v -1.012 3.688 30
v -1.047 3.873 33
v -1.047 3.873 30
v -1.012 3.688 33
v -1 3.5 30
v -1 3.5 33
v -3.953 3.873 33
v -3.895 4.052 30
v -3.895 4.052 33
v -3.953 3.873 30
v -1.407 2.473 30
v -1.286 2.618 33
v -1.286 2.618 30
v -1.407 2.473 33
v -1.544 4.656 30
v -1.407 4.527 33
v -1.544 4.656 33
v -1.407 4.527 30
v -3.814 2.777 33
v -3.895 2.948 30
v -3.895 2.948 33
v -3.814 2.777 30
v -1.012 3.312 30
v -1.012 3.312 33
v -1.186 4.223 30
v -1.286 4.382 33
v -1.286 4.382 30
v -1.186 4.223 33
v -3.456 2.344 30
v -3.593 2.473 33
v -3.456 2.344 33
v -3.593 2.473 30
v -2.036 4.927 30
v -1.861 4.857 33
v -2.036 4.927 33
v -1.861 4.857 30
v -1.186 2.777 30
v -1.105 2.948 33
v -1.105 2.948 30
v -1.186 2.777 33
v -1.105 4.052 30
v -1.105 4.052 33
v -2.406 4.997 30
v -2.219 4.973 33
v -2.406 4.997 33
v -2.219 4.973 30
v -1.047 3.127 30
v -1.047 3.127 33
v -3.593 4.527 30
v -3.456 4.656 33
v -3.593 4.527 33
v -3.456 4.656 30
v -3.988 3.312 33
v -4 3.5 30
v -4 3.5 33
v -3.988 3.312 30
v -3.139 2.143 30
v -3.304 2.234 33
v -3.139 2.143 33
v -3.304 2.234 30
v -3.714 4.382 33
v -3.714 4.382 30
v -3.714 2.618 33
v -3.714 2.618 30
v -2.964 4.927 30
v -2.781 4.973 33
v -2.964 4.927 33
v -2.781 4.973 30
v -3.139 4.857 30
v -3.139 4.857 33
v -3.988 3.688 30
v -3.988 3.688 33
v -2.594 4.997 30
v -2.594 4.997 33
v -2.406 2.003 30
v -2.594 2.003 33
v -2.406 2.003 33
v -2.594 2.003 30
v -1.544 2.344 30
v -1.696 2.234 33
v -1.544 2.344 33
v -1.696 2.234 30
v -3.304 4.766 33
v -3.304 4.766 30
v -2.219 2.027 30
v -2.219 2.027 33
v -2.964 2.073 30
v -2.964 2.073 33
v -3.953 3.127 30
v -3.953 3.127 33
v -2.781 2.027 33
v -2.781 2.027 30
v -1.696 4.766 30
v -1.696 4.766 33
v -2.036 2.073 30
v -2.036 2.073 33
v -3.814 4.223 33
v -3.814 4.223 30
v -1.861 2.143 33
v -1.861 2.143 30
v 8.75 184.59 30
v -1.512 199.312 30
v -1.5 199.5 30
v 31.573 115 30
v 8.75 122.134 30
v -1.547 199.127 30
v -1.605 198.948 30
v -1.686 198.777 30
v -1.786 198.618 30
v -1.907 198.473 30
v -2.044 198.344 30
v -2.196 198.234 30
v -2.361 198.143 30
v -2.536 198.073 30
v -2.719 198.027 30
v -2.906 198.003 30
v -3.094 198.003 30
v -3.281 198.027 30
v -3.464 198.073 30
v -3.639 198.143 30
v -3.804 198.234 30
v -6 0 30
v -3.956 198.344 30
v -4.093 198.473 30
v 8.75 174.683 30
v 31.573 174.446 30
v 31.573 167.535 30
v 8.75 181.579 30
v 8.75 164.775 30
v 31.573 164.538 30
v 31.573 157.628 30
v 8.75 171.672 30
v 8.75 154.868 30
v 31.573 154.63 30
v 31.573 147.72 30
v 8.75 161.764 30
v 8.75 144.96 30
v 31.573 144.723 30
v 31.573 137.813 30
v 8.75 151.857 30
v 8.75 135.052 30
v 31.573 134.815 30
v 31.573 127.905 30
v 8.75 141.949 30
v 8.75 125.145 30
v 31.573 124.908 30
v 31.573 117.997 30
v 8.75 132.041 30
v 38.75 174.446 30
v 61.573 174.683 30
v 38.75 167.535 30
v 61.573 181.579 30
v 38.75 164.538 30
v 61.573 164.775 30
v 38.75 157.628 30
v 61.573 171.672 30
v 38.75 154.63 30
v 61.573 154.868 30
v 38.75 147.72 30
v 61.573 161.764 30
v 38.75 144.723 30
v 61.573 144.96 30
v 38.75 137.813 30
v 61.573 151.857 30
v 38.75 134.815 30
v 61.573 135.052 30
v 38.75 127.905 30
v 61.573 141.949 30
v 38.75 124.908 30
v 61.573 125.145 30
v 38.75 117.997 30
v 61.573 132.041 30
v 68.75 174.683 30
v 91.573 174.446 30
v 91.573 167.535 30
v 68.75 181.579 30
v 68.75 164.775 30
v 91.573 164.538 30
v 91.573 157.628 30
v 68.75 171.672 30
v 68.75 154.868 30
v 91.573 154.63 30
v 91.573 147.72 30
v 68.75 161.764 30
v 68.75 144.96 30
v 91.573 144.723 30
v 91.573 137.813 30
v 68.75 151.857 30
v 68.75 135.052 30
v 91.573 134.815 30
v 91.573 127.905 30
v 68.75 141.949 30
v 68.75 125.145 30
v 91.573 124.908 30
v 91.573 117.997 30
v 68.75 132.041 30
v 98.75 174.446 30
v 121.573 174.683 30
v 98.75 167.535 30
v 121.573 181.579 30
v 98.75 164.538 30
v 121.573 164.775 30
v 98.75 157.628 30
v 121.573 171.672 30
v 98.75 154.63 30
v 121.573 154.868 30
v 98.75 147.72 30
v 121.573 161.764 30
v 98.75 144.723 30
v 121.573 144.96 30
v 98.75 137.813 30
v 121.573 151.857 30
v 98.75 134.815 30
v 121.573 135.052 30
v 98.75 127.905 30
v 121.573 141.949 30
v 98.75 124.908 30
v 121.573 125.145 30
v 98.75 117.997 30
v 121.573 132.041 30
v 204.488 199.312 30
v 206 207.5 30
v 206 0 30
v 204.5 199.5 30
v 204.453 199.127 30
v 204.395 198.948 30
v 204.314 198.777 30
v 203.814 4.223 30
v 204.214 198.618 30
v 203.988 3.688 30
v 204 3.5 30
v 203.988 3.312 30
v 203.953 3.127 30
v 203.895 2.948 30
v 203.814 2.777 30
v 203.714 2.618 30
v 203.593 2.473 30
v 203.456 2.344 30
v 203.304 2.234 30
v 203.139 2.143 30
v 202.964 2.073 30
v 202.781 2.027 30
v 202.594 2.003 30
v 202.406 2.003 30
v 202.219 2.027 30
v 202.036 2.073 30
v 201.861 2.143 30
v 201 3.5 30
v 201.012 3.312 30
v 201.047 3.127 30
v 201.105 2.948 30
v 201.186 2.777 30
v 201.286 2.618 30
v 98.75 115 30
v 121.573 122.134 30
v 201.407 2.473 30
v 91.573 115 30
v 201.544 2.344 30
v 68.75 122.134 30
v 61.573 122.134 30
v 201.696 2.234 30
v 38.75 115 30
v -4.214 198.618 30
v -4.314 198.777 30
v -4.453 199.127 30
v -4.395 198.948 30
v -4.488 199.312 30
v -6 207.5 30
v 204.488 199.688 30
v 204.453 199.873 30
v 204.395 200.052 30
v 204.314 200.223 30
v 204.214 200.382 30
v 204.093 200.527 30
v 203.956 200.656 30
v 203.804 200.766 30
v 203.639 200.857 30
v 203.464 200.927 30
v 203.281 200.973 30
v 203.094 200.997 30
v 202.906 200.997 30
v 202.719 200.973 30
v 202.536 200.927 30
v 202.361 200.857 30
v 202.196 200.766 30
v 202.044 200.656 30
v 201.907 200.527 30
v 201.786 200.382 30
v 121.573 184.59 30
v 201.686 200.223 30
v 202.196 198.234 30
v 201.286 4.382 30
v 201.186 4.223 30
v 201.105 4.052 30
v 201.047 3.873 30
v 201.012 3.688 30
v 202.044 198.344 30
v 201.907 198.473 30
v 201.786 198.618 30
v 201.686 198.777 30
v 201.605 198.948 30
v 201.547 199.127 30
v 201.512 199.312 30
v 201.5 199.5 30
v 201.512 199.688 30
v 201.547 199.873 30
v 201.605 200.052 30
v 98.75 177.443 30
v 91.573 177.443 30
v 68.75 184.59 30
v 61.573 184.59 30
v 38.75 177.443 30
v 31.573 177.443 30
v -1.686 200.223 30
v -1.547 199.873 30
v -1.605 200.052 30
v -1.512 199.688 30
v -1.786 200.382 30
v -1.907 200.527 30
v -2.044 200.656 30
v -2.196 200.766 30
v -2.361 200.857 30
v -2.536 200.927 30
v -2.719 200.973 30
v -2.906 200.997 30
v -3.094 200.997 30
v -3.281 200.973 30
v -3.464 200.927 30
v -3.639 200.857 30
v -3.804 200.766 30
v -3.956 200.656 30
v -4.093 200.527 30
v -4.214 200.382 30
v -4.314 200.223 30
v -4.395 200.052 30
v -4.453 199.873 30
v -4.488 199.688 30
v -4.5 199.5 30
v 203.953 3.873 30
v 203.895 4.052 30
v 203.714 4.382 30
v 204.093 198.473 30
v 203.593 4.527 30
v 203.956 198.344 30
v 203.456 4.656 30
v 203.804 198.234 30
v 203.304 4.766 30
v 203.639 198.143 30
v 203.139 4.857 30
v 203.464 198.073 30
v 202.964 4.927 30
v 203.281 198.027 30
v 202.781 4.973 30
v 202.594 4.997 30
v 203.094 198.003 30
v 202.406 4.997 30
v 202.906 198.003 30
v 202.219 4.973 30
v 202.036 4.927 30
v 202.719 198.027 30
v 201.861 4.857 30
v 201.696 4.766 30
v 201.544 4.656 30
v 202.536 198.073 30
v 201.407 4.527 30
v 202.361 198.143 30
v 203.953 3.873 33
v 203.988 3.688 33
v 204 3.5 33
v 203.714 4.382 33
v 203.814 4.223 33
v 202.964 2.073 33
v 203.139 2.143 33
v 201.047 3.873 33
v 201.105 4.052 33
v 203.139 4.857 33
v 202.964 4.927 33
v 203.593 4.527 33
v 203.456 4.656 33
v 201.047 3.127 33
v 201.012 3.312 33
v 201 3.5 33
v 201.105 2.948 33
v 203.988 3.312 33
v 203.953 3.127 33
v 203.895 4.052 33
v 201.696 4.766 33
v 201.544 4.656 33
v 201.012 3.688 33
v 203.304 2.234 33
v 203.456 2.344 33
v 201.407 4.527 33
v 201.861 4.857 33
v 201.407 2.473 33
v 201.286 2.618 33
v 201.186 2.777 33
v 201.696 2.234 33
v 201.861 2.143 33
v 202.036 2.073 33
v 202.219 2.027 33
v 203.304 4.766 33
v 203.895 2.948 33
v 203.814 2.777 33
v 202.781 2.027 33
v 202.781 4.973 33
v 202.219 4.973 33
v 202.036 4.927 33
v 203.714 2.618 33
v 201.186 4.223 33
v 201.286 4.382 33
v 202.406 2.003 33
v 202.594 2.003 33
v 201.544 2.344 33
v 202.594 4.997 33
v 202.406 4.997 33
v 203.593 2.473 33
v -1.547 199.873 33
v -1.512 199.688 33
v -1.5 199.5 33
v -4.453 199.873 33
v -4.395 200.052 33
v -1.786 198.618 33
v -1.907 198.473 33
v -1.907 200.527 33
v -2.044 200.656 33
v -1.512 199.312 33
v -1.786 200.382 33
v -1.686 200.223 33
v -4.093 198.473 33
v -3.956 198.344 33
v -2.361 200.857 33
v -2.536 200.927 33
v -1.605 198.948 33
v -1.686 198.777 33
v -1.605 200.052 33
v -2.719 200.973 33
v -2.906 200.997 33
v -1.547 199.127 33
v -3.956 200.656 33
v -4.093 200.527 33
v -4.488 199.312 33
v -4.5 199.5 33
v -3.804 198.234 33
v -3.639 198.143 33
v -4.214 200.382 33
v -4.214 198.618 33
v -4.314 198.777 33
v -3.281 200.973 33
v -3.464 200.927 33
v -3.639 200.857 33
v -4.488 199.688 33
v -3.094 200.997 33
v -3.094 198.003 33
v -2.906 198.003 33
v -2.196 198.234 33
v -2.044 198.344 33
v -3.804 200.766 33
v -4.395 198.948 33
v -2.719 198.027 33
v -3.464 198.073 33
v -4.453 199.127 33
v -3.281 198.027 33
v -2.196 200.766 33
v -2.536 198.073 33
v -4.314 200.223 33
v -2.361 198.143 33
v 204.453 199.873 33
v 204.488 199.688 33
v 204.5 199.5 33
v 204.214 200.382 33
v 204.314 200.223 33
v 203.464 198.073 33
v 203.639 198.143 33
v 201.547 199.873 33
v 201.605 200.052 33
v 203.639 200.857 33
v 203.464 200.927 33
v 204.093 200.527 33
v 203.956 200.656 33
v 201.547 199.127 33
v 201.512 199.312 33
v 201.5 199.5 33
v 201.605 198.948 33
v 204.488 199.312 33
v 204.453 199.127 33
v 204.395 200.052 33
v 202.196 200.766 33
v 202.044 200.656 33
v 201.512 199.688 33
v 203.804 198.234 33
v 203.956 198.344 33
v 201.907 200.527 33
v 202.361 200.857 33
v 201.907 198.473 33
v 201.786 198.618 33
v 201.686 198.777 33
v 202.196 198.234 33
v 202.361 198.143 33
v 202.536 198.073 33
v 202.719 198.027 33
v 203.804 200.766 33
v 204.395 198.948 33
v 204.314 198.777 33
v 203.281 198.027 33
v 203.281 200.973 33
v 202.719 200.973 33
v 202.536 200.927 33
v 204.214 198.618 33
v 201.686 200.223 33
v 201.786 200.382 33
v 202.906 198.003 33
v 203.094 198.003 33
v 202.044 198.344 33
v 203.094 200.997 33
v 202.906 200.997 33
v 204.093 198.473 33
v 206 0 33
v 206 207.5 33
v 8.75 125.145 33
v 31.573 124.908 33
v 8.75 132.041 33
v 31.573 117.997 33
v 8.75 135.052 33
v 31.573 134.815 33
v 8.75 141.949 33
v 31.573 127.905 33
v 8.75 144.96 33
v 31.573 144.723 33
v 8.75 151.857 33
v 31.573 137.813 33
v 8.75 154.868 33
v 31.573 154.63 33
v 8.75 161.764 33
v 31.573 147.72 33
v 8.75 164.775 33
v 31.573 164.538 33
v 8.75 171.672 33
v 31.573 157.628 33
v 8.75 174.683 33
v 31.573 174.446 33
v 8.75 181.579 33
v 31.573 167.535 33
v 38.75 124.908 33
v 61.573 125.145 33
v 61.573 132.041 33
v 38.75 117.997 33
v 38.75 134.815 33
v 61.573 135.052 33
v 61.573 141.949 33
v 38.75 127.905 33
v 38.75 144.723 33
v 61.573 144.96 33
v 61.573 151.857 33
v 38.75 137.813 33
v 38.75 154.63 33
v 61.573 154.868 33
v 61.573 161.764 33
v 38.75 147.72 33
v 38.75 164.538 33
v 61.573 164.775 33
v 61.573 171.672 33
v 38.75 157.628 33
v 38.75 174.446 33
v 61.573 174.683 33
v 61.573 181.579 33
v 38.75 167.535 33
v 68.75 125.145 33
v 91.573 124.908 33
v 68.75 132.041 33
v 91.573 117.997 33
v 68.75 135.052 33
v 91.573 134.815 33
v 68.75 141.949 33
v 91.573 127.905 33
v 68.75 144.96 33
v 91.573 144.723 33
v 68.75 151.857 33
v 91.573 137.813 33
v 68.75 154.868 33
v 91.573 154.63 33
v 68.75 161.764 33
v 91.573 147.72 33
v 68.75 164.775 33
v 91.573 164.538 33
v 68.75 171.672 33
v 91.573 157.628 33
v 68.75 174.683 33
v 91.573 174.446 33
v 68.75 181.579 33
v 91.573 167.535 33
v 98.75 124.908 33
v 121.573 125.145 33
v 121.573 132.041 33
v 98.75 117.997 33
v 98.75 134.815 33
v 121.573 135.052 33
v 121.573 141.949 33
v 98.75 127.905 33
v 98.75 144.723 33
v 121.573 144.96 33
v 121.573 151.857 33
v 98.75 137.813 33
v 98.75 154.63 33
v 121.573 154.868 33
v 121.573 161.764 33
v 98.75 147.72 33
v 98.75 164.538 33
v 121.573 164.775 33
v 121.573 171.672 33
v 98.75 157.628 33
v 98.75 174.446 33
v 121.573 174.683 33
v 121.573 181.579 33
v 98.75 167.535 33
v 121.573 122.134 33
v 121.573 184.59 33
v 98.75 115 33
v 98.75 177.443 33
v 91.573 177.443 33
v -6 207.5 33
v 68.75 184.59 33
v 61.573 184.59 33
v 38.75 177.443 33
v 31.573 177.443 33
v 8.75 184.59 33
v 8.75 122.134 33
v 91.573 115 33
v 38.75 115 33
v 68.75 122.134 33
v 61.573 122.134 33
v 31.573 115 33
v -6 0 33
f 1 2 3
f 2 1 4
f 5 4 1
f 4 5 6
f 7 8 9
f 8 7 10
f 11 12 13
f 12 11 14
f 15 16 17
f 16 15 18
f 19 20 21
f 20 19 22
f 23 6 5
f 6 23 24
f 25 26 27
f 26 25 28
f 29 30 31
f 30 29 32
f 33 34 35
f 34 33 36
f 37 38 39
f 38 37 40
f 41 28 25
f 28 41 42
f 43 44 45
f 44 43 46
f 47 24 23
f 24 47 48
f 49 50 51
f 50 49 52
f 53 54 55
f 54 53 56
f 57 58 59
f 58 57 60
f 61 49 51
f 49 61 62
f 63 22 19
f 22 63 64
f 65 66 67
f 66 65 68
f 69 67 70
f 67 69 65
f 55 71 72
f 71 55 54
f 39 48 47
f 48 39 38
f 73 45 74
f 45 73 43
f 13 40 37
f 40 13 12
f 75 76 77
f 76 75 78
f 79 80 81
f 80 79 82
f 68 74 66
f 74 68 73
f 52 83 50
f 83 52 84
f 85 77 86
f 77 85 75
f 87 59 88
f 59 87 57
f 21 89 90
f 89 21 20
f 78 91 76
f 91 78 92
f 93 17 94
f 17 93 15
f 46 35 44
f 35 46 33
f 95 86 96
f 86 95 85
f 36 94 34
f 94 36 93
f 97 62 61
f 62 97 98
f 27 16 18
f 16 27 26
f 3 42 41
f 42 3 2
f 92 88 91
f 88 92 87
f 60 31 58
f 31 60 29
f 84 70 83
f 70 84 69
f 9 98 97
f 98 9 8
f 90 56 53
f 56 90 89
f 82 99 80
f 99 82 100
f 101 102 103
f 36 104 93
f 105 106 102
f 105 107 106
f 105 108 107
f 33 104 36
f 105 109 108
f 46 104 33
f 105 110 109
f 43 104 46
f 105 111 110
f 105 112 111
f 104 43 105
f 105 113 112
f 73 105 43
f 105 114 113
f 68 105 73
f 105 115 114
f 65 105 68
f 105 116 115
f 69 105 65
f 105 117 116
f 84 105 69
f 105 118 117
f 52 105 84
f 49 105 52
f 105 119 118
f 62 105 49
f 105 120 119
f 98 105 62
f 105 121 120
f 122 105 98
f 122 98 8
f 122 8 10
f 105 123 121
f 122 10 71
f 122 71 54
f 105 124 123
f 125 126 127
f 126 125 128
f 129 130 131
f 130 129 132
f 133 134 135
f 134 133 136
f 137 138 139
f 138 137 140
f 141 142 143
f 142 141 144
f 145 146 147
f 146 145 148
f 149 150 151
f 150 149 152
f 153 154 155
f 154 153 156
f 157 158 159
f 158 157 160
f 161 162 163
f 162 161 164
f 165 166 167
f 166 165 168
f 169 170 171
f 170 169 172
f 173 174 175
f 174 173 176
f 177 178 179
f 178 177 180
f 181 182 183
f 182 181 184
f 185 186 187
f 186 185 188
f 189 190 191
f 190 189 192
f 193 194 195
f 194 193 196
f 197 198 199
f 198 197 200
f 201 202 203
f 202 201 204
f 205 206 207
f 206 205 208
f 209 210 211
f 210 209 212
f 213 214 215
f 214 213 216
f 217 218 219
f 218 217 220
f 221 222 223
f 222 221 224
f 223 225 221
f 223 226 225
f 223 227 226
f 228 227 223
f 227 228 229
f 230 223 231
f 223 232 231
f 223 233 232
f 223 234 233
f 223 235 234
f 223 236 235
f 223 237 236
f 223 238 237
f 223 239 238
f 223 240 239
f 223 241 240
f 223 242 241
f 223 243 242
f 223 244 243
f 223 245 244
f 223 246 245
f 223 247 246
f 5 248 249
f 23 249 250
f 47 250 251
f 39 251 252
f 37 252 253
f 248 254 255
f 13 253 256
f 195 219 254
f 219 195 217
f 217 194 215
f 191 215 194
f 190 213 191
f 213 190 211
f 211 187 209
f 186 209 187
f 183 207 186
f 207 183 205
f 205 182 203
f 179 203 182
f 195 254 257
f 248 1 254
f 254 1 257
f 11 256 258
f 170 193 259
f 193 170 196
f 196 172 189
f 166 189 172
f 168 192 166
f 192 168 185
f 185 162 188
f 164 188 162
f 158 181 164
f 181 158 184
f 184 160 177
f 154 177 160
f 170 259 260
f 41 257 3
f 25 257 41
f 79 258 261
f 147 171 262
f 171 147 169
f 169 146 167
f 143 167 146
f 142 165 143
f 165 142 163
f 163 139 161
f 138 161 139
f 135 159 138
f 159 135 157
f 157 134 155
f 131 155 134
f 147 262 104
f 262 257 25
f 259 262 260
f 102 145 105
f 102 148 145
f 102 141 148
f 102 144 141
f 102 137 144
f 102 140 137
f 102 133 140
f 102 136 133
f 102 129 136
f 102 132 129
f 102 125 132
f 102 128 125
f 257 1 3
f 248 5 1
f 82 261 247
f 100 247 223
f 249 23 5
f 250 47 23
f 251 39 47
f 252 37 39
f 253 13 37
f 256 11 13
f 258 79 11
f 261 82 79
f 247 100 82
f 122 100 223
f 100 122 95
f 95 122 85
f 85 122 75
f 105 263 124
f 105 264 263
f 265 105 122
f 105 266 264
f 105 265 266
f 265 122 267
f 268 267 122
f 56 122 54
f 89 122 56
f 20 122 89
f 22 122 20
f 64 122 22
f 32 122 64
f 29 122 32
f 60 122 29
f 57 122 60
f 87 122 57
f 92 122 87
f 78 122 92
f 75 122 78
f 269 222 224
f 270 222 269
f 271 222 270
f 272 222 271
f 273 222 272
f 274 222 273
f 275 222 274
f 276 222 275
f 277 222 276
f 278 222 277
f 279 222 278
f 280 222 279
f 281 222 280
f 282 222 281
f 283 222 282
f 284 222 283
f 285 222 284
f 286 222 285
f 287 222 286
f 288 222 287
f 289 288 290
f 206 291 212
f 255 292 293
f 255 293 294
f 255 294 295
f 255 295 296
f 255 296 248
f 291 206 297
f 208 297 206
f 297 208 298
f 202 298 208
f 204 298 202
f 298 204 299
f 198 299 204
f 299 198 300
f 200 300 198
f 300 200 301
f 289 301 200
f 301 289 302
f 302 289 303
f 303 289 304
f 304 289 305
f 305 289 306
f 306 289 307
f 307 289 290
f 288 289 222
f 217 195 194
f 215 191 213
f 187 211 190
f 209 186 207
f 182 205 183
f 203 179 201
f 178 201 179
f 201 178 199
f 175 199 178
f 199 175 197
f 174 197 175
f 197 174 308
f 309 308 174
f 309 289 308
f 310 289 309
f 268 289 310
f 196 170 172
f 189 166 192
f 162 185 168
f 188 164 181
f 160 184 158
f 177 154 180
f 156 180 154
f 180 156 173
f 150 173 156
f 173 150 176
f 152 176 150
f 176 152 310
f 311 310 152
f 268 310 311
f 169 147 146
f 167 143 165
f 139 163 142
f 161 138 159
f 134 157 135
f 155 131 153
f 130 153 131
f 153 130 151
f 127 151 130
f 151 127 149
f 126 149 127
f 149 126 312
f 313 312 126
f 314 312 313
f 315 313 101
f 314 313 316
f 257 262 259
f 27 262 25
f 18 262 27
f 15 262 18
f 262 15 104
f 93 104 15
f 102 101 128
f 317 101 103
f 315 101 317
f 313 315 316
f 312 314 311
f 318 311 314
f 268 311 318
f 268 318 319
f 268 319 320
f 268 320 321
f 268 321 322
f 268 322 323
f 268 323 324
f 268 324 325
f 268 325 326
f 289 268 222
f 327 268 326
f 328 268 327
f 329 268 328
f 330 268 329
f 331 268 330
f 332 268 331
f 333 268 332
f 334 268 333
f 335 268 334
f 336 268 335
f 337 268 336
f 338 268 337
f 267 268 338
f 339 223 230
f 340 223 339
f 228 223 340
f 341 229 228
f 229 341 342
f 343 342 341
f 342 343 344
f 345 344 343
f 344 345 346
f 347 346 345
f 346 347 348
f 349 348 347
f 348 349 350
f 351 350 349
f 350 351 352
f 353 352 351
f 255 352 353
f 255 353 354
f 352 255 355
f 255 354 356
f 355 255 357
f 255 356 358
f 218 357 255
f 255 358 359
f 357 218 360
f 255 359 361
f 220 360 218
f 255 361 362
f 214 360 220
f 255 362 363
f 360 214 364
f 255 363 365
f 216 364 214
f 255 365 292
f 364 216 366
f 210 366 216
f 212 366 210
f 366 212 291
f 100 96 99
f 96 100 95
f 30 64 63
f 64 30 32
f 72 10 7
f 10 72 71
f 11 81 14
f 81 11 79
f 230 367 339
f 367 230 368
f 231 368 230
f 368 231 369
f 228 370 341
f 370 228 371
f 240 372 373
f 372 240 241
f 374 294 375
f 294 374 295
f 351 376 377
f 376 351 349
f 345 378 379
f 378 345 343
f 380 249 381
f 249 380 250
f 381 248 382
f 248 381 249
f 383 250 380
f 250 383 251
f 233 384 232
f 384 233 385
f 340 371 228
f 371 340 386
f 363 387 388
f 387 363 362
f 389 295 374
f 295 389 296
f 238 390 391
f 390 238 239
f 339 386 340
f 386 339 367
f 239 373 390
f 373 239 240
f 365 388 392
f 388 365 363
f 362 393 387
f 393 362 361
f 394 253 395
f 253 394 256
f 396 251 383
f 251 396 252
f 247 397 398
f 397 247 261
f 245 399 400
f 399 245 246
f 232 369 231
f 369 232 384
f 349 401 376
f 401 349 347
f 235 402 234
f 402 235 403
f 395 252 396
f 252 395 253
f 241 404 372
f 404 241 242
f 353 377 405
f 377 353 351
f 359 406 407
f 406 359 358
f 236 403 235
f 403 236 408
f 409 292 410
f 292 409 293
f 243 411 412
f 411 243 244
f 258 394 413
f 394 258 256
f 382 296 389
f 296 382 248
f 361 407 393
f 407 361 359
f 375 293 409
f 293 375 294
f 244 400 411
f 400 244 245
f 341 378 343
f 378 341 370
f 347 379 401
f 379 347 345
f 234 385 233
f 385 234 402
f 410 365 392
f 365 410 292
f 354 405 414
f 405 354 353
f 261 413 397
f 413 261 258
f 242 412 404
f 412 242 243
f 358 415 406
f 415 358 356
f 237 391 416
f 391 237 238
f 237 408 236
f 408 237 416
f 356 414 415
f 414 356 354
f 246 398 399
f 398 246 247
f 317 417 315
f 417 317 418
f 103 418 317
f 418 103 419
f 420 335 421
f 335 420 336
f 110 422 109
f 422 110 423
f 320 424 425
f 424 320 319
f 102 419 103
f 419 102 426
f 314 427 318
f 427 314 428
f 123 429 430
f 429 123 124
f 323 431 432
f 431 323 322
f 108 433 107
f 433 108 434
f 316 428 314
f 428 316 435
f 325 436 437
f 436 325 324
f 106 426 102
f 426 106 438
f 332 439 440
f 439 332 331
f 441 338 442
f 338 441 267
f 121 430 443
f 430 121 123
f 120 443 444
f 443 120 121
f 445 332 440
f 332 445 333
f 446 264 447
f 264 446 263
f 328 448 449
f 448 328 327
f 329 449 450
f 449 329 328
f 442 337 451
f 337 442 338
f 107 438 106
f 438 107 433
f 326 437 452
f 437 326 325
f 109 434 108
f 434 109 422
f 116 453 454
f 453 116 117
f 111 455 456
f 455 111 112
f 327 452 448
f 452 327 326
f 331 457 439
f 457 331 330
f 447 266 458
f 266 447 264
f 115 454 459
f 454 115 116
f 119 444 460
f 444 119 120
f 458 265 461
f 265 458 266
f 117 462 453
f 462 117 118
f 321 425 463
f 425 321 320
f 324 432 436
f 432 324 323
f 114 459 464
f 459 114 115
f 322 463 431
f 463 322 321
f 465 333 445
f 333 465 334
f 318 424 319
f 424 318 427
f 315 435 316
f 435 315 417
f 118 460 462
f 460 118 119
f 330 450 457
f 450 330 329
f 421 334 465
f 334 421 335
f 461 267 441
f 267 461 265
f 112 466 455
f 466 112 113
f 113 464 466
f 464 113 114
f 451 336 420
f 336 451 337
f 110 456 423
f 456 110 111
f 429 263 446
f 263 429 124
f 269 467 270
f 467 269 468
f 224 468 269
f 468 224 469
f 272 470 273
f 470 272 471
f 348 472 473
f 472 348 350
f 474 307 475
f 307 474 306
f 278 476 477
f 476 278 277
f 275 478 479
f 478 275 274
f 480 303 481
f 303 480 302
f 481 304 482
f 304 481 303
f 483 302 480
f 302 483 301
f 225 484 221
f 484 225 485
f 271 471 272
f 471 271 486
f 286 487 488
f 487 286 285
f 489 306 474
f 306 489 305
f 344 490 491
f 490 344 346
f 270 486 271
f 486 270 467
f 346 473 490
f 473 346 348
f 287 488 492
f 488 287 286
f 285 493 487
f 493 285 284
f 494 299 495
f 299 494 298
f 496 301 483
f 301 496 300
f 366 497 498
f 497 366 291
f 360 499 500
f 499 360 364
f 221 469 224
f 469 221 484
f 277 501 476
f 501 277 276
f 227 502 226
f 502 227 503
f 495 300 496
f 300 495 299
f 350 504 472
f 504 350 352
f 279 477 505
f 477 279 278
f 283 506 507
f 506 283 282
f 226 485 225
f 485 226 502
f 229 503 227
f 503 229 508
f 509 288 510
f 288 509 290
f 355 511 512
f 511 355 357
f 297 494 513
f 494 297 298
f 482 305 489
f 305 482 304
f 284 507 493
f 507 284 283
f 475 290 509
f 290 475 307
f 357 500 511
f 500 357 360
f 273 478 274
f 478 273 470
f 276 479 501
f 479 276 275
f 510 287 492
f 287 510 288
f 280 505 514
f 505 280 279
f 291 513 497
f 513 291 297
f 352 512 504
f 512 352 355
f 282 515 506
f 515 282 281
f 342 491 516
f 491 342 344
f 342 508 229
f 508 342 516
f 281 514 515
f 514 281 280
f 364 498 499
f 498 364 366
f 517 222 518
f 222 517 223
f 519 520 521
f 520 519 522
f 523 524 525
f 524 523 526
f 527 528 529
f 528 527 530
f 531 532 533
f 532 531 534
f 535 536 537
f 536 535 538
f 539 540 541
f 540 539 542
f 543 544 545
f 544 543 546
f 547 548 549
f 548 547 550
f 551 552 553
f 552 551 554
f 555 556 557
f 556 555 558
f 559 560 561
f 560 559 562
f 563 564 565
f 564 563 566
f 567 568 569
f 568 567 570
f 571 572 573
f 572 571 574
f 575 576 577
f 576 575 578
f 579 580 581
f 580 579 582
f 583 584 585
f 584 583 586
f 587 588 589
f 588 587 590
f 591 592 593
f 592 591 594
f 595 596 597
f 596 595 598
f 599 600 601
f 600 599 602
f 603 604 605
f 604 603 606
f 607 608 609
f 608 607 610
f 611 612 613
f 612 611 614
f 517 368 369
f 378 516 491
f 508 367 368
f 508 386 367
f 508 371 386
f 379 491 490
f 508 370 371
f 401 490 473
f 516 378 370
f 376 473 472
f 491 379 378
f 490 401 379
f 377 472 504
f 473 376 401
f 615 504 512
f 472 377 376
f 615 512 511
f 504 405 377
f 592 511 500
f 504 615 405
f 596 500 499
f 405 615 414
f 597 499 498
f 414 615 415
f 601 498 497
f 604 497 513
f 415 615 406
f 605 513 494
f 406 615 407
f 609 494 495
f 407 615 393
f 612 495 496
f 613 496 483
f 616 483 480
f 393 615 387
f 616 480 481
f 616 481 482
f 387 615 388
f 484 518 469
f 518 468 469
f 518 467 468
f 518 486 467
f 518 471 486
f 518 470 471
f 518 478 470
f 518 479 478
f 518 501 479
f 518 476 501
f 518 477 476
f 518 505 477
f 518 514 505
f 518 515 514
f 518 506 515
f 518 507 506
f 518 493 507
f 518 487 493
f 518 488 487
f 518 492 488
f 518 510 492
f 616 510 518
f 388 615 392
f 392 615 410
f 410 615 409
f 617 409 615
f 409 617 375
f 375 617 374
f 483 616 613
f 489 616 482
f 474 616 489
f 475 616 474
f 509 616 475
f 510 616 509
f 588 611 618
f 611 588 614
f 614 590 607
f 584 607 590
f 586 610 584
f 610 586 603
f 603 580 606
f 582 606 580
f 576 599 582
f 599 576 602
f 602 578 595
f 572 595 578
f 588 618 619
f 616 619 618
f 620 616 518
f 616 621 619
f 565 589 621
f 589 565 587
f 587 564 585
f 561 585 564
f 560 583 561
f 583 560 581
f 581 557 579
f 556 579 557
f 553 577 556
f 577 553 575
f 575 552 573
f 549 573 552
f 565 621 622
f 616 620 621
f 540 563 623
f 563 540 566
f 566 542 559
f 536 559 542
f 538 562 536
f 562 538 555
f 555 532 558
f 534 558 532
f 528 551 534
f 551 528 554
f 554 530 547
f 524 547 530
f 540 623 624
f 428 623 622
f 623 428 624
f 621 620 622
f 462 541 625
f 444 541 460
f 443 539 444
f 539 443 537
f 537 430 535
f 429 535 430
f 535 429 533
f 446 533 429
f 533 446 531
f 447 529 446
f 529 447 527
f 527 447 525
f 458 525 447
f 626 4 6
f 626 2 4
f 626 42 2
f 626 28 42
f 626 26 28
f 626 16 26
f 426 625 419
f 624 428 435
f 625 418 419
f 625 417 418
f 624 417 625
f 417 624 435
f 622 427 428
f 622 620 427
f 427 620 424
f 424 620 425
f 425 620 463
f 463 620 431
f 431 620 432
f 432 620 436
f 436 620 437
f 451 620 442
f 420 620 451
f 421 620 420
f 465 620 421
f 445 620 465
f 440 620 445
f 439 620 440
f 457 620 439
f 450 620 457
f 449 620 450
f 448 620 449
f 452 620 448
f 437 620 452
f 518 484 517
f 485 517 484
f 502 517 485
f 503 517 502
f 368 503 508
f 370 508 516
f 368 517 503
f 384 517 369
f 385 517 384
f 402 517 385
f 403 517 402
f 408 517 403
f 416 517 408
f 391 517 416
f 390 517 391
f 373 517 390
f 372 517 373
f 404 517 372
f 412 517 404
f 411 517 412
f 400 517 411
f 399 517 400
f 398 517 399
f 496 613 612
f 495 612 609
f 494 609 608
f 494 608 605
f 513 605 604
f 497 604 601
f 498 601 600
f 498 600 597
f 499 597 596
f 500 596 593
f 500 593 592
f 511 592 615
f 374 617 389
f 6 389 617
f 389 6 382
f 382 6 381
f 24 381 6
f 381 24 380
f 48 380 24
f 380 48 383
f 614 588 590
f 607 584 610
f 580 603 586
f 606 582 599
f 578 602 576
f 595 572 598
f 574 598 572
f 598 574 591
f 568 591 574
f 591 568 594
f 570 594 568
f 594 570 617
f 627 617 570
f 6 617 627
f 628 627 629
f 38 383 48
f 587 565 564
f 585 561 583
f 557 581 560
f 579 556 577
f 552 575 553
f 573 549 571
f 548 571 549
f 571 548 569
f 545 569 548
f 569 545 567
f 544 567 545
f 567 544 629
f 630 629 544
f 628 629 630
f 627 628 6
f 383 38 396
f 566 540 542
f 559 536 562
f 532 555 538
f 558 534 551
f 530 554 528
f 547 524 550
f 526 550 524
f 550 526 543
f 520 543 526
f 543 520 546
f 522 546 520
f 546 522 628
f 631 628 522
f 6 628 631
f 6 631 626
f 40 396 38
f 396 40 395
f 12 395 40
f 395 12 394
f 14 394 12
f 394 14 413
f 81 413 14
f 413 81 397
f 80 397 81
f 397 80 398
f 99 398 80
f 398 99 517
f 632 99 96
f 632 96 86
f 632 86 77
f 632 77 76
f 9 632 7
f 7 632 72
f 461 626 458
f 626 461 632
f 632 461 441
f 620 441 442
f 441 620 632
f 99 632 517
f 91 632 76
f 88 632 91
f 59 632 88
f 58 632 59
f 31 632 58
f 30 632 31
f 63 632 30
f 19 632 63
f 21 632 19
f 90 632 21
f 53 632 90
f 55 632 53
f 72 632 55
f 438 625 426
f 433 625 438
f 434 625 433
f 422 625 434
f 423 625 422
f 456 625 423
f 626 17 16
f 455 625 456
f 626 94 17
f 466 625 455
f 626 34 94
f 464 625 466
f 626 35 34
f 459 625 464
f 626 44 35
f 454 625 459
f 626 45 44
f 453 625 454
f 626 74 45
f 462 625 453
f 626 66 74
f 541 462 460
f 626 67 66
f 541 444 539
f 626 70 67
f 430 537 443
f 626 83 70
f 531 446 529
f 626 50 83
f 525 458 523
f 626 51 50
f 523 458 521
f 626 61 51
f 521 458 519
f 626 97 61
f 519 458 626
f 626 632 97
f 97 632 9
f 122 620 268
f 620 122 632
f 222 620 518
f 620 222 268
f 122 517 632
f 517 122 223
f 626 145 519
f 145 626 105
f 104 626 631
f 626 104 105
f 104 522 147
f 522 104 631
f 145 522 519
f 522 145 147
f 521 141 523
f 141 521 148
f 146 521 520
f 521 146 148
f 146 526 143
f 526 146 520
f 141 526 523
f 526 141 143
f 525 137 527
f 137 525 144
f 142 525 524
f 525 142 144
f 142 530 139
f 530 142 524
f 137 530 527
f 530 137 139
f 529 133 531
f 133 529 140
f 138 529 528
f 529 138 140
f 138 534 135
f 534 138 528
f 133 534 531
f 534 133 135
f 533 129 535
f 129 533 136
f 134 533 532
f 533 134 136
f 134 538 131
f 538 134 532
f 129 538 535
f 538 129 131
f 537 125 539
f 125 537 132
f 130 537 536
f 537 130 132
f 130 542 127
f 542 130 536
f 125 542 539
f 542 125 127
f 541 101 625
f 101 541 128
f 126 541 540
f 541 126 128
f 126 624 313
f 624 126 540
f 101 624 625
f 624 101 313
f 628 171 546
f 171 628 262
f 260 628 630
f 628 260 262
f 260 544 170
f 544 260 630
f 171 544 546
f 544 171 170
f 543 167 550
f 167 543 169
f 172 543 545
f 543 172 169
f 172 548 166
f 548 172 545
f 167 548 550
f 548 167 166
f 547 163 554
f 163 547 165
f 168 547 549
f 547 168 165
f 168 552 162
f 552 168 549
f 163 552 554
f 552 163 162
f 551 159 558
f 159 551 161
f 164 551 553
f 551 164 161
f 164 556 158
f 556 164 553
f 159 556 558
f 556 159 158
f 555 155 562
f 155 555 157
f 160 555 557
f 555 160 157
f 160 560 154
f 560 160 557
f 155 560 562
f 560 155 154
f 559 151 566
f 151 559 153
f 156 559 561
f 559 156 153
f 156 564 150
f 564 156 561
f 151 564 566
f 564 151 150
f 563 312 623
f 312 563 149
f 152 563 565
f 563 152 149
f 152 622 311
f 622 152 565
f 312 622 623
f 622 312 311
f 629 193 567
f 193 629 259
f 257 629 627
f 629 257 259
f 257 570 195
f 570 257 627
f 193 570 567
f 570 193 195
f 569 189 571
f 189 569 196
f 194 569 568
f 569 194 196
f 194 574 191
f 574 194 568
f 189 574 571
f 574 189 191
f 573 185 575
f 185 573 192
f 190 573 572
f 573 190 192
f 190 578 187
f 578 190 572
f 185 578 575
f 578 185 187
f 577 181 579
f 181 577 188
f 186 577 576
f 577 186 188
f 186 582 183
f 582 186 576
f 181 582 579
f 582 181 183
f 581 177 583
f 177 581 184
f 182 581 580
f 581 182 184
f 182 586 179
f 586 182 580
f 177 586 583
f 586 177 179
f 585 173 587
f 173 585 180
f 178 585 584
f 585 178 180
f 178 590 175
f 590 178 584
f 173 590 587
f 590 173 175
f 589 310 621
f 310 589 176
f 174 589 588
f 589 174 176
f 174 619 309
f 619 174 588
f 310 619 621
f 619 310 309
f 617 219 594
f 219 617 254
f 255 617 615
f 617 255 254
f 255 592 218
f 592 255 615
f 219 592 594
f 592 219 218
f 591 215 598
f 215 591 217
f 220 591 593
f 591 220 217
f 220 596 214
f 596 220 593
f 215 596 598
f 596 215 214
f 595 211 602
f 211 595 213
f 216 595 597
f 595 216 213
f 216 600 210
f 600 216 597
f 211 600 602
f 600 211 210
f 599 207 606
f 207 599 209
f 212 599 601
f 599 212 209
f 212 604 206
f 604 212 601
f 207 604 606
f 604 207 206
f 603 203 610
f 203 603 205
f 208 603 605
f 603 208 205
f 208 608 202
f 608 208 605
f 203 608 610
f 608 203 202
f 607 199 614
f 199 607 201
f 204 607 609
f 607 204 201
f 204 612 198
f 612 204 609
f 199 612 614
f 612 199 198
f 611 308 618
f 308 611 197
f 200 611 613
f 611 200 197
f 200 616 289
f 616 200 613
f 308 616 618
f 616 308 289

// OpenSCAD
// file: hdd_caddy.scad
// Hard Drive Width
$hhdWidth = 102.5;

// Base Plate
$baseHeight_mm = 3;
$baseLength_mm = 136 - 5 - 5 + 13;
$baseWidth_mm = 115.5;
// Base Plate holes
$baseHoleWidth_mm = 37;
$baseHoleLength_mm = 52;

$secondRowHolesOffset = 30;

// Rails
$railHeight_mm = 11.5 + $secondRowHolesOffset + 4.5;
$railLength_mm = $baseLength_mm;
$railWidth_mm = ($baseWidth_mm - $hhdWidth) / 2;

// Rail Notch
$railNotchHeight = $railHeight_mm - 4;
$railNotchLength = $railLength_mm - 8;
$railNotchWidth = $railWidth_mm - 1;

// HDD hole locations starting from the back
$holeXAxisOffset_mm = 18;
$holeHeightOffset = $baseHeight_mm + 6;
$holeDiameter_mm = 4;


$holeOne = $holeXAxisOffset_mm + 6;
//$holeTwo = $holeXAxisOffset_mm + 37 + $holeDiameter_mm + 6;
$holeTwo = 84;
$holeThree = $holeXAxisOffset_mm + 97 + $holeDiameter_mm + 6;


module drawMounts() {
    // Draw the base unit
    union() {
        // Draw the first rail
        firstRail();

        // Draw the second rail
        secondRail();
    }
}



// It is really (x,y,z), but named differently because the rotate
// screws it up.
module screwHole(xOffset, zOffset, yOffset) {
    rotate(a=[90,0,0]) {
        translate([xOffset,yOffset,(0 - $railWidth_mm)-1]) {
            cylinder(h=$railWidth_mm+2, d=$holeDiameter_mm,$fn=20);
        }
    }
}
// main file
include <hdd_caddy.scad>;

$basePlateLength_mm = 170 + 30;
$basePlateWidth_mm = 100 + $baseWidth_mm - 8;
$basePlateHeight_mm = 3;
$wallHeight = 20 + $basePlateHeight_mm + $railHeight_mm + 15;
$wallWidth = 6;

//color([1,0.5,0.5]) translate([240, 50, 9]) rotate([0,0,180]) import("cm4_io_board.stl");

$fn=50;

echo($wallHeight);

// Top Plate
translate([0-$wallWidth,0,30]) color([0,1,0]) {
    difference() {
        cube([$basePlateLength_mm+(2*$wallWidth),$basePlateWidth_mm,$basePlateHeight_mm]);
        
        translate([$wallWidth,0,0]) {
            translate([-2.5,3.5,0]) cylinder(d=3, h=4);
            translate([$basePlateLength_mm + 2.5,3.5,0]) cylinder(d=3, h=4);
            translate([-3,$basePlateWidth_mm - 8,0]) cylinder(d=3, h=4);
            translate([$basePlateLength_mm + 3,$basePlateWidth_mm - 8,0]) cylinder(d=3, h=4);
        }
        
        translate([35,115,-1]) scale([1,1,1]) rotate([0,0,90]) linear_extrude(5) text("///////", size=20, font="Ubuntu:style=Bold");
        translate([65,115,-1]) scale([1,1,1]) rotate([0,0,90]) linear_extrude(5) text("\\\\\\\\\\\\\\", size=20, font="Ubuntu:style=Bold");
        
        translate([95,115,-1]) scale([1,1,1]) rotate([0,0,90]) linear_extrude(5) text("///////", size=20, font="Ubuntu:style=Bold");
        translate([125,115,-1]) scale([1,1,1]) rotate([0,0,90]) linear_extrude(5) text("\\\\\\\\\\\\\\", size=20, font="Ubuntu:style=Bold");
    }

    
}
